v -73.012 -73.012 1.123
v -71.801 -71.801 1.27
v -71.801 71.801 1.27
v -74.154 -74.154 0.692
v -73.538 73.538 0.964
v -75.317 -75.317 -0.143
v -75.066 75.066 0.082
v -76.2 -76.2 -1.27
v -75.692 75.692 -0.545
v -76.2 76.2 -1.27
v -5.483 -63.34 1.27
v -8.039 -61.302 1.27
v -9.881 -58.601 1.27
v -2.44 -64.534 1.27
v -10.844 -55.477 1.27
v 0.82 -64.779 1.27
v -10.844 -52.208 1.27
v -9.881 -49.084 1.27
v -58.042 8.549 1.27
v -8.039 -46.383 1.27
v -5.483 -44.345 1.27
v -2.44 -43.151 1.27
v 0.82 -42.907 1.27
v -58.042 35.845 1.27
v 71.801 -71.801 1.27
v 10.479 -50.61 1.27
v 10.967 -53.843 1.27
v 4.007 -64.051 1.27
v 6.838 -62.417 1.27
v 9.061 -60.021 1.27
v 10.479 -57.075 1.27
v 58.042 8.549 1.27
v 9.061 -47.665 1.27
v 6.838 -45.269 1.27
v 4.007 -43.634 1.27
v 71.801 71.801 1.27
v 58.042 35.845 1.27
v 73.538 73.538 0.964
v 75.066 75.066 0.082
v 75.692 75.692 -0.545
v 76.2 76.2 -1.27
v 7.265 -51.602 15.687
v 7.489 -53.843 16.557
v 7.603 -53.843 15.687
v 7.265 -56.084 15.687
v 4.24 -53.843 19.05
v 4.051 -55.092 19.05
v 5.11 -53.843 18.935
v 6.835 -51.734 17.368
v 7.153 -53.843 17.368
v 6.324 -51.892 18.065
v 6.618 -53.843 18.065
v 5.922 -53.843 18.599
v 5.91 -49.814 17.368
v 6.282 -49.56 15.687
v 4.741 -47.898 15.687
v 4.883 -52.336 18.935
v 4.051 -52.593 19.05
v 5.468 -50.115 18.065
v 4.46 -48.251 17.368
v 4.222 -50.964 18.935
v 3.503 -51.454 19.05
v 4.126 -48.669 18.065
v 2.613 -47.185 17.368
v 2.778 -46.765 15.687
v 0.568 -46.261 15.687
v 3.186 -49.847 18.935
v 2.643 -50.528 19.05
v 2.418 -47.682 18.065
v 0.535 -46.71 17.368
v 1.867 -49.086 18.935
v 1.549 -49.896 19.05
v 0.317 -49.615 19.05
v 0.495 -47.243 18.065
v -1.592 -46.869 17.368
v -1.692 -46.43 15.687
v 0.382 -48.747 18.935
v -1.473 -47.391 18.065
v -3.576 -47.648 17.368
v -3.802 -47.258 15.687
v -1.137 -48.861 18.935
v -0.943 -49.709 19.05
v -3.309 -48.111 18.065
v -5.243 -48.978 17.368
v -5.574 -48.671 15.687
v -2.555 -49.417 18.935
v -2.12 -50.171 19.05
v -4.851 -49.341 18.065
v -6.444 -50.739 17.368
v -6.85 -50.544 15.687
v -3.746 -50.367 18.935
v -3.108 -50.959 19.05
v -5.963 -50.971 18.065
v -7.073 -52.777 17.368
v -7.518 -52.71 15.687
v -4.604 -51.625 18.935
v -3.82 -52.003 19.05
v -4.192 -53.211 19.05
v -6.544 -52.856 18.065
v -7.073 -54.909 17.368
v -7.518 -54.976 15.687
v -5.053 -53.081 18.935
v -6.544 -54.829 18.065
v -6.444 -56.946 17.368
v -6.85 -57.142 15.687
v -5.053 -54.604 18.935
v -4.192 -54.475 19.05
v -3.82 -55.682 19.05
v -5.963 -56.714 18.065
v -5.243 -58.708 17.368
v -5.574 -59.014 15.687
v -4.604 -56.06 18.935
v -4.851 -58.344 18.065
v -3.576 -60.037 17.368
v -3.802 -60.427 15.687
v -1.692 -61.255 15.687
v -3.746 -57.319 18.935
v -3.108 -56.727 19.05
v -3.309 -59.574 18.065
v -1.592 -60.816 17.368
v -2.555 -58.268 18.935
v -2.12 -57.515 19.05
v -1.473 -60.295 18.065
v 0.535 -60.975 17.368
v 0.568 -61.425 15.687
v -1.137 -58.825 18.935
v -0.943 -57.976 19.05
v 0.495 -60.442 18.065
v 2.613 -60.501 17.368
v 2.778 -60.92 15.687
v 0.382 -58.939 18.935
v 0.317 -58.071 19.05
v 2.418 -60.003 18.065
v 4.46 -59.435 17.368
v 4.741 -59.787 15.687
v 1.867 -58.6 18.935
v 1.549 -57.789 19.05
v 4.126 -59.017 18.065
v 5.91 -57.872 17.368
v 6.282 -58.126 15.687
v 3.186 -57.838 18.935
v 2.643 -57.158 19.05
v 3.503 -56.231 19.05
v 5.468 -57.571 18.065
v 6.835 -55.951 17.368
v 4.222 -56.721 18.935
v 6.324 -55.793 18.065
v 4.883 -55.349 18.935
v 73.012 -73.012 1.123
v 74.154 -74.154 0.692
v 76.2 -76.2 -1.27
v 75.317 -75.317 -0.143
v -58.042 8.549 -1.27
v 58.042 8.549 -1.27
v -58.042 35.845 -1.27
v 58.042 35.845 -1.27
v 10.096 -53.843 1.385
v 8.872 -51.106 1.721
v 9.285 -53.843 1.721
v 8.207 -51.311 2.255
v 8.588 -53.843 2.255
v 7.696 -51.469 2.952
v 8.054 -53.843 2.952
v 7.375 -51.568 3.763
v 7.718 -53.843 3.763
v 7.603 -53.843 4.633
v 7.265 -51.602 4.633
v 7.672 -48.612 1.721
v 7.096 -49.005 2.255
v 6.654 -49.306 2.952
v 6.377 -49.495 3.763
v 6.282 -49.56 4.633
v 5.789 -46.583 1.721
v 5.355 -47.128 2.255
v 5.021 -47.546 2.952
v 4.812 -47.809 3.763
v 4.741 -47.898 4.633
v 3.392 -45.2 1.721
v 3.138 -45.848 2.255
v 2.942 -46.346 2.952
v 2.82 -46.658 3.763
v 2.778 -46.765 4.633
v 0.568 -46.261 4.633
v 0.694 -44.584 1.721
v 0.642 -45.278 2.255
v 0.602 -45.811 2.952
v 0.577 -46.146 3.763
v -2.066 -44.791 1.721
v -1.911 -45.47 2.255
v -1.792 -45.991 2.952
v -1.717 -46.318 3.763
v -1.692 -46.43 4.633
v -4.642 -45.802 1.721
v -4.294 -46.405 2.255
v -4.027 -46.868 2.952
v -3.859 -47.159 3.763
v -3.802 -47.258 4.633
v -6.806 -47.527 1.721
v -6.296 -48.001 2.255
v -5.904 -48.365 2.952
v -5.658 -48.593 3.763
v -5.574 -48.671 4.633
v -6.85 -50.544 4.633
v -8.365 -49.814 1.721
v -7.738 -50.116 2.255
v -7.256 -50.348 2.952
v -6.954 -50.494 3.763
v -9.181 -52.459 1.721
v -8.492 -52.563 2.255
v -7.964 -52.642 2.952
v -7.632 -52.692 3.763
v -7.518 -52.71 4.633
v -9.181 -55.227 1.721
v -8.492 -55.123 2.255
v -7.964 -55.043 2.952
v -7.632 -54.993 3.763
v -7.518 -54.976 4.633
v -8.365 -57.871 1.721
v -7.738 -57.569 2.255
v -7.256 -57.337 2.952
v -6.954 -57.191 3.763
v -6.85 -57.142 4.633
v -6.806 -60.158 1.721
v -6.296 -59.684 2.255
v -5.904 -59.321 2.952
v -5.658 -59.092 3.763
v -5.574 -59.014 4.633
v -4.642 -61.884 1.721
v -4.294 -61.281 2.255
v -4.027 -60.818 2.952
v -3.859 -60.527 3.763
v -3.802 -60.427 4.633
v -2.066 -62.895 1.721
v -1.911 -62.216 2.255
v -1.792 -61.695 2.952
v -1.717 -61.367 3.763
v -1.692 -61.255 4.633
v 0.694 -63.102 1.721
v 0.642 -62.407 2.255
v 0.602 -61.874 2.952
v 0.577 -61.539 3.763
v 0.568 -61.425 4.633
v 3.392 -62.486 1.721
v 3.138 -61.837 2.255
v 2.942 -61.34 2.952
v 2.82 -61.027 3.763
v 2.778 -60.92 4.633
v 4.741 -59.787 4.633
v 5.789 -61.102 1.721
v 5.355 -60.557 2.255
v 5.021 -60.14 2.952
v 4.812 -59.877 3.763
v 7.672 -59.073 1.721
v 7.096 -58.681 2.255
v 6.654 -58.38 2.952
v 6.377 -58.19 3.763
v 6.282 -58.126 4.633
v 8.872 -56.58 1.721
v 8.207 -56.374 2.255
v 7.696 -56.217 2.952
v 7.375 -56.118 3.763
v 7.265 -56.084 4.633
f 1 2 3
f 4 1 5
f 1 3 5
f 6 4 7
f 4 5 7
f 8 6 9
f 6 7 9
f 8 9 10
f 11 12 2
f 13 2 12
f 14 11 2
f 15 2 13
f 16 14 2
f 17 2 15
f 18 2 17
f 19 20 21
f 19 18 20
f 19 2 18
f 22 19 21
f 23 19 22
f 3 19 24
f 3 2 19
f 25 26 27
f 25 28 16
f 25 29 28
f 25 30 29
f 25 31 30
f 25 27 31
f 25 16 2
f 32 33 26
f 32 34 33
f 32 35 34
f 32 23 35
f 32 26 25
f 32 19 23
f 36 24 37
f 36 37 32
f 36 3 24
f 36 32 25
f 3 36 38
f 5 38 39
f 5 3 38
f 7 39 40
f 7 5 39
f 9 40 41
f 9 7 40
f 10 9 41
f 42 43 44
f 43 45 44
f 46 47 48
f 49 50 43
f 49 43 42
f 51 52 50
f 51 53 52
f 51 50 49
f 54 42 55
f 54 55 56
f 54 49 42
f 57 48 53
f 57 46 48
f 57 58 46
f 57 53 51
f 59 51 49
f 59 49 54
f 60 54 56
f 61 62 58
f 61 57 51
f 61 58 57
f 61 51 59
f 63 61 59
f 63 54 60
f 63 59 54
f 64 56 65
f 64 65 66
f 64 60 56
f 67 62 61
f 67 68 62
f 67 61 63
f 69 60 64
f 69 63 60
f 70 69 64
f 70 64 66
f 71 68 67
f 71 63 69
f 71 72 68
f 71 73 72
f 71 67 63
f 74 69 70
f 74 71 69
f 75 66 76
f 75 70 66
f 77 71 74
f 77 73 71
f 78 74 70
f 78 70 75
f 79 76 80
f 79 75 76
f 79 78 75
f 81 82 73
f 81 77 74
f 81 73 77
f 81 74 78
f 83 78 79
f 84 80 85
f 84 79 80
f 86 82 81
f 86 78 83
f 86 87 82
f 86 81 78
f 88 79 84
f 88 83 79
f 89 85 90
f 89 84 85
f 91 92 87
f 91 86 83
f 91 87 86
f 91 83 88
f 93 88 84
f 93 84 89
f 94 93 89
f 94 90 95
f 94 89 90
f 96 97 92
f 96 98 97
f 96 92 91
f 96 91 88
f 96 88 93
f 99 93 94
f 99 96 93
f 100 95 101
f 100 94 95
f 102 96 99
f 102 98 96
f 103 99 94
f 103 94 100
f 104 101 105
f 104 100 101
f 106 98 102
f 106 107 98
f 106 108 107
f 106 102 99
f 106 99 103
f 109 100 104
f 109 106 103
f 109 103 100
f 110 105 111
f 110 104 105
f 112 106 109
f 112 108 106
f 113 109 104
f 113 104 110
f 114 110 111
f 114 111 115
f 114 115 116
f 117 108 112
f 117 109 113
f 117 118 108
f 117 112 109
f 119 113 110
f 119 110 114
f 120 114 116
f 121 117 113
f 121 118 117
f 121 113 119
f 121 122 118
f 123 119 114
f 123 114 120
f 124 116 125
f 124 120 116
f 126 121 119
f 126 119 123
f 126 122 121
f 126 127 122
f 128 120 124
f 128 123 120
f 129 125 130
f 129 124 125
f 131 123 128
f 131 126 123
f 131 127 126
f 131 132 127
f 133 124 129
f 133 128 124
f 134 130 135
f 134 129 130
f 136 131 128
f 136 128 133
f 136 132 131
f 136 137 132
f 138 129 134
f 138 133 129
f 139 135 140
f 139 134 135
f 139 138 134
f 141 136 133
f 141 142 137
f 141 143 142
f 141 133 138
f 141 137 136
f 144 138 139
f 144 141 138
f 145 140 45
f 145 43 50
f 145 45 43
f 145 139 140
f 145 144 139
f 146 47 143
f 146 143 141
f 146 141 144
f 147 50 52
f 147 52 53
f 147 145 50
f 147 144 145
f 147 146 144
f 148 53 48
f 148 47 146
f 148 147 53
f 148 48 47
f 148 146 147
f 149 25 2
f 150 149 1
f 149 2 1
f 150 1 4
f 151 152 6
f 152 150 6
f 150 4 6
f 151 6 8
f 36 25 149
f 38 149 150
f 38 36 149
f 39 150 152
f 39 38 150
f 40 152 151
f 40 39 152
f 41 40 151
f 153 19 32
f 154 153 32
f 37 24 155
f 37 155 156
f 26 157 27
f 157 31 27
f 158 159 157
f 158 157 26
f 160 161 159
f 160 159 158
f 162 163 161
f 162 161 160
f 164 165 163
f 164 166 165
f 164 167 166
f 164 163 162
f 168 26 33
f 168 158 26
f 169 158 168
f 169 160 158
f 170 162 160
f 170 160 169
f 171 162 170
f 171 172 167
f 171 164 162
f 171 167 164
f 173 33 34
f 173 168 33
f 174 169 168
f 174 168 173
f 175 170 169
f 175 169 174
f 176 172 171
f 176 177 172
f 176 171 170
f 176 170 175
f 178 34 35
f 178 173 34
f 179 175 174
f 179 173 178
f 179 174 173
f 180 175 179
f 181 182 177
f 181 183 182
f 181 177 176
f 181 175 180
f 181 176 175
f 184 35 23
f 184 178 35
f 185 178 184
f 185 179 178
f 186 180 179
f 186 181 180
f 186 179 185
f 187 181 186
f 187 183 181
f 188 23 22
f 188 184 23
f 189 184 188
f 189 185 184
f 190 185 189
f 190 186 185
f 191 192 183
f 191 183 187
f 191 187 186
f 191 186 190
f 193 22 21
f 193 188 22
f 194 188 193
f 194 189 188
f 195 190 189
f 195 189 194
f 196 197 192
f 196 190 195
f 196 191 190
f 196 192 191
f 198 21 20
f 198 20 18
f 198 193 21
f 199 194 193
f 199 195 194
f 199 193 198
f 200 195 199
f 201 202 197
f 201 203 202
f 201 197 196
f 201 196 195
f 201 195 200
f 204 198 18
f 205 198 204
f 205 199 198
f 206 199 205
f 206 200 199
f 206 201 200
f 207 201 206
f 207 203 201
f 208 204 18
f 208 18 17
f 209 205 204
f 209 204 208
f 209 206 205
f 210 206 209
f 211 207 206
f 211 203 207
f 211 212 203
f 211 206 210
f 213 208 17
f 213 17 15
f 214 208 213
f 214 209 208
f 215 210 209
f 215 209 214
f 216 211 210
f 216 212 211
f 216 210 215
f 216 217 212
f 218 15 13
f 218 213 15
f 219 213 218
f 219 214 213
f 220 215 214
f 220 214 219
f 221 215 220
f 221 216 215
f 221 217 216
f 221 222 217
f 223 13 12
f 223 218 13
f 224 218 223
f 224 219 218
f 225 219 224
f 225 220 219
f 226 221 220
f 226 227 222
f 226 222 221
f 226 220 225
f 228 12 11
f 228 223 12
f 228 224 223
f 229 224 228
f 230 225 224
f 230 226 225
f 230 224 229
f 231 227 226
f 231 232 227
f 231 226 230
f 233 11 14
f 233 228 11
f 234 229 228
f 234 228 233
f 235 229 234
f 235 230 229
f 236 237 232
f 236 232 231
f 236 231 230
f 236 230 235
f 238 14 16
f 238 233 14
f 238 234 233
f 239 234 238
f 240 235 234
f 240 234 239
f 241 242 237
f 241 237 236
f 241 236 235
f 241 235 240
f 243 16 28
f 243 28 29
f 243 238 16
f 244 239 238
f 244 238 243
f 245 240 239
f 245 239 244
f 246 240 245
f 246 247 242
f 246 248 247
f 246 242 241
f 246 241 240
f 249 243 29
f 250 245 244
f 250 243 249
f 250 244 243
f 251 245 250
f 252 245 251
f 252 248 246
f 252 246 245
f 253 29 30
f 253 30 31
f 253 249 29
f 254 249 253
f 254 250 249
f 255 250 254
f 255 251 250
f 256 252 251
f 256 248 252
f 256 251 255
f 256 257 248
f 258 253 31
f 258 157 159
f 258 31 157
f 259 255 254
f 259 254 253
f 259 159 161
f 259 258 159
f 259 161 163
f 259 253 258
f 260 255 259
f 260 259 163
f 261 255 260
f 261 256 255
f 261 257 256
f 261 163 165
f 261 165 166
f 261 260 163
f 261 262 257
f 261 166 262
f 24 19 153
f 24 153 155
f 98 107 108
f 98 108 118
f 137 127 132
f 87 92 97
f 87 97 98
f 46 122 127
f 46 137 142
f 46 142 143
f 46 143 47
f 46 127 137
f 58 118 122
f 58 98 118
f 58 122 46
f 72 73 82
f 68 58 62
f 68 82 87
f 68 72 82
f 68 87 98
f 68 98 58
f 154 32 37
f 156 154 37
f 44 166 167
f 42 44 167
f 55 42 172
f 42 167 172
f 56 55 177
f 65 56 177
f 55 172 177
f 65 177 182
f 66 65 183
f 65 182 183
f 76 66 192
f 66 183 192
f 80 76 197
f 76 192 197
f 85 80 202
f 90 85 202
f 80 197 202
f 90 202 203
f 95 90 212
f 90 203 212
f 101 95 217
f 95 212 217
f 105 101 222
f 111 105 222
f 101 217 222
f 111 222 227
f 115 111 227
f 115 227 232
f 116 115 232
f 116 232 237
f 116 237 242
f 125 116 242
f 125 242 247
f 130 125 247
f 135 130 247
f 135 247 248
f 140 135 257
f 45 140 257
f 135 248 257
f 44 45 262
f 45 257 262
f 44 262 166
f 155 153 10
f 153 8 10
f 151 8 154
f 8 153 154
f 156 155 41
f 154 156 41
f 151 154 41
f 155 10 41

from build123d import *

# Parameters (mm, degrees)
F0_W          = 152.4
F0_H          = 2.54
F1_DEPTH      = 76.2
F1_DEPTH_BACK = 76.2
F2_W          = 116.0843670368
F2_H          = 27.2963345051
F3_DEPTH      = 25.4
F4_R          = 7.6032374963
F5_DEPTH      = 17.78
F6_R          = 3.3634669128
F7_T1_DEPTH   = 174.3970452561
F7_T3_DEPTH   = 174.3970452561


# Not quite as in the source:
# - a fillet or chamfer that OpenCascade refuses, or shapes differently, is made with other operations: its cross-section is extruded or revolved along the edge and cut away or added


with BuildPart() as f1:
    # F0 (on Front) → F1 (new body, two sides)
    with BuildSketch(Plane.XZ) as f1_sk:
        Rectangle(F0_W, F0_H)
    extrude(amount=-F1_DEPTH)
    extrude(f1_sk.sketch, amount=F1_DEPTH_BACK)

    # F2 (on face) → F3 (cut)
    with BuildSketch(Plane.XY.offset(1.27)):
        with Locations((0, 22.1970230341)):
            Rectangle(F2_W, F2_H)
    extrude(amount=-F3_DEPTH, mode=Mode.SUBTRACT)

    # F4 (on face) → F5 (join)
    with BuildSketch(Plane.XY.offset(1.27)):
        with Locations((0, -53.8427531719)):
            Circle(F4_R)
    extrude(amount=F5_DEPTH)

    # F6
    f6_edges = [f1.edges().sort_by_distance(p)[0] for p in [
        (7.603237, -53.842753, 10.16),
        (-7.603237, -53.842753, 1.27),
        (-7.603237, -53.842753, 19.05),
    ]]
    fillet(f6_edges, radius=F6_R)

    # F7: fillet of radius 5.08 on 4 edges, made by hand

    # F7_s2 → F7_t1 (cut)
    with BuildSketch(Plane.YZ.offset(-87.1985226281)):
        with BuildLine():
            ThreePointArc((-71.8005909488, 1.27), (-74.3405909488, 0.5894090512), (-76.2, -1.27))
            Line((-76.2, -1.27), (-76.2, 1.27))
            Line((-76.2, 1.27), (-71.8005909488, 1.27))
        make_face()
        with BuildLine():
            ThreePointArc((71.8005909488, 1.27), (74.3405909488, 0.5894090512), (76.2, -1.27))
            Line((76.2, -1.27), (76.2, 1.27))
            Line((76.2, 1.27), (71.8005909488, 1.27))
        make_face()
    extrude(amount=F7_T1_DEPTH, mode=Mode.SUBTRACT)

    # F7_s4 → F7_t3 (cut)
    with BuildSketch(Plane.XZ.offset(-87.1985226281)):
        with BuildLine():
            ThreePointArc((71.8005909488, 1.27), (74.3405909488, 0.5894090512), (76.2, -1.27))
            Line((76.2, -1.27), (76.2, 1.27))
            Line((76.2, 1.27), (71.8005909488, 1.27))
        make_face()
        with BuildLine():
            ThreePointArc((-71.8005909488, 1.27), (-74.3405909488, 0.5894090512), (-76.2, -1.27))
            Line((-76.2, -1.27), (-76.2, 1.27))
            Line((-76.2, 1.27), (-71.8005909488, 1.27))
        make_face()
    extrude(amount=F7_T3_DEPTH, mode=Mode.SUBTRACT)


solid = f1.part
